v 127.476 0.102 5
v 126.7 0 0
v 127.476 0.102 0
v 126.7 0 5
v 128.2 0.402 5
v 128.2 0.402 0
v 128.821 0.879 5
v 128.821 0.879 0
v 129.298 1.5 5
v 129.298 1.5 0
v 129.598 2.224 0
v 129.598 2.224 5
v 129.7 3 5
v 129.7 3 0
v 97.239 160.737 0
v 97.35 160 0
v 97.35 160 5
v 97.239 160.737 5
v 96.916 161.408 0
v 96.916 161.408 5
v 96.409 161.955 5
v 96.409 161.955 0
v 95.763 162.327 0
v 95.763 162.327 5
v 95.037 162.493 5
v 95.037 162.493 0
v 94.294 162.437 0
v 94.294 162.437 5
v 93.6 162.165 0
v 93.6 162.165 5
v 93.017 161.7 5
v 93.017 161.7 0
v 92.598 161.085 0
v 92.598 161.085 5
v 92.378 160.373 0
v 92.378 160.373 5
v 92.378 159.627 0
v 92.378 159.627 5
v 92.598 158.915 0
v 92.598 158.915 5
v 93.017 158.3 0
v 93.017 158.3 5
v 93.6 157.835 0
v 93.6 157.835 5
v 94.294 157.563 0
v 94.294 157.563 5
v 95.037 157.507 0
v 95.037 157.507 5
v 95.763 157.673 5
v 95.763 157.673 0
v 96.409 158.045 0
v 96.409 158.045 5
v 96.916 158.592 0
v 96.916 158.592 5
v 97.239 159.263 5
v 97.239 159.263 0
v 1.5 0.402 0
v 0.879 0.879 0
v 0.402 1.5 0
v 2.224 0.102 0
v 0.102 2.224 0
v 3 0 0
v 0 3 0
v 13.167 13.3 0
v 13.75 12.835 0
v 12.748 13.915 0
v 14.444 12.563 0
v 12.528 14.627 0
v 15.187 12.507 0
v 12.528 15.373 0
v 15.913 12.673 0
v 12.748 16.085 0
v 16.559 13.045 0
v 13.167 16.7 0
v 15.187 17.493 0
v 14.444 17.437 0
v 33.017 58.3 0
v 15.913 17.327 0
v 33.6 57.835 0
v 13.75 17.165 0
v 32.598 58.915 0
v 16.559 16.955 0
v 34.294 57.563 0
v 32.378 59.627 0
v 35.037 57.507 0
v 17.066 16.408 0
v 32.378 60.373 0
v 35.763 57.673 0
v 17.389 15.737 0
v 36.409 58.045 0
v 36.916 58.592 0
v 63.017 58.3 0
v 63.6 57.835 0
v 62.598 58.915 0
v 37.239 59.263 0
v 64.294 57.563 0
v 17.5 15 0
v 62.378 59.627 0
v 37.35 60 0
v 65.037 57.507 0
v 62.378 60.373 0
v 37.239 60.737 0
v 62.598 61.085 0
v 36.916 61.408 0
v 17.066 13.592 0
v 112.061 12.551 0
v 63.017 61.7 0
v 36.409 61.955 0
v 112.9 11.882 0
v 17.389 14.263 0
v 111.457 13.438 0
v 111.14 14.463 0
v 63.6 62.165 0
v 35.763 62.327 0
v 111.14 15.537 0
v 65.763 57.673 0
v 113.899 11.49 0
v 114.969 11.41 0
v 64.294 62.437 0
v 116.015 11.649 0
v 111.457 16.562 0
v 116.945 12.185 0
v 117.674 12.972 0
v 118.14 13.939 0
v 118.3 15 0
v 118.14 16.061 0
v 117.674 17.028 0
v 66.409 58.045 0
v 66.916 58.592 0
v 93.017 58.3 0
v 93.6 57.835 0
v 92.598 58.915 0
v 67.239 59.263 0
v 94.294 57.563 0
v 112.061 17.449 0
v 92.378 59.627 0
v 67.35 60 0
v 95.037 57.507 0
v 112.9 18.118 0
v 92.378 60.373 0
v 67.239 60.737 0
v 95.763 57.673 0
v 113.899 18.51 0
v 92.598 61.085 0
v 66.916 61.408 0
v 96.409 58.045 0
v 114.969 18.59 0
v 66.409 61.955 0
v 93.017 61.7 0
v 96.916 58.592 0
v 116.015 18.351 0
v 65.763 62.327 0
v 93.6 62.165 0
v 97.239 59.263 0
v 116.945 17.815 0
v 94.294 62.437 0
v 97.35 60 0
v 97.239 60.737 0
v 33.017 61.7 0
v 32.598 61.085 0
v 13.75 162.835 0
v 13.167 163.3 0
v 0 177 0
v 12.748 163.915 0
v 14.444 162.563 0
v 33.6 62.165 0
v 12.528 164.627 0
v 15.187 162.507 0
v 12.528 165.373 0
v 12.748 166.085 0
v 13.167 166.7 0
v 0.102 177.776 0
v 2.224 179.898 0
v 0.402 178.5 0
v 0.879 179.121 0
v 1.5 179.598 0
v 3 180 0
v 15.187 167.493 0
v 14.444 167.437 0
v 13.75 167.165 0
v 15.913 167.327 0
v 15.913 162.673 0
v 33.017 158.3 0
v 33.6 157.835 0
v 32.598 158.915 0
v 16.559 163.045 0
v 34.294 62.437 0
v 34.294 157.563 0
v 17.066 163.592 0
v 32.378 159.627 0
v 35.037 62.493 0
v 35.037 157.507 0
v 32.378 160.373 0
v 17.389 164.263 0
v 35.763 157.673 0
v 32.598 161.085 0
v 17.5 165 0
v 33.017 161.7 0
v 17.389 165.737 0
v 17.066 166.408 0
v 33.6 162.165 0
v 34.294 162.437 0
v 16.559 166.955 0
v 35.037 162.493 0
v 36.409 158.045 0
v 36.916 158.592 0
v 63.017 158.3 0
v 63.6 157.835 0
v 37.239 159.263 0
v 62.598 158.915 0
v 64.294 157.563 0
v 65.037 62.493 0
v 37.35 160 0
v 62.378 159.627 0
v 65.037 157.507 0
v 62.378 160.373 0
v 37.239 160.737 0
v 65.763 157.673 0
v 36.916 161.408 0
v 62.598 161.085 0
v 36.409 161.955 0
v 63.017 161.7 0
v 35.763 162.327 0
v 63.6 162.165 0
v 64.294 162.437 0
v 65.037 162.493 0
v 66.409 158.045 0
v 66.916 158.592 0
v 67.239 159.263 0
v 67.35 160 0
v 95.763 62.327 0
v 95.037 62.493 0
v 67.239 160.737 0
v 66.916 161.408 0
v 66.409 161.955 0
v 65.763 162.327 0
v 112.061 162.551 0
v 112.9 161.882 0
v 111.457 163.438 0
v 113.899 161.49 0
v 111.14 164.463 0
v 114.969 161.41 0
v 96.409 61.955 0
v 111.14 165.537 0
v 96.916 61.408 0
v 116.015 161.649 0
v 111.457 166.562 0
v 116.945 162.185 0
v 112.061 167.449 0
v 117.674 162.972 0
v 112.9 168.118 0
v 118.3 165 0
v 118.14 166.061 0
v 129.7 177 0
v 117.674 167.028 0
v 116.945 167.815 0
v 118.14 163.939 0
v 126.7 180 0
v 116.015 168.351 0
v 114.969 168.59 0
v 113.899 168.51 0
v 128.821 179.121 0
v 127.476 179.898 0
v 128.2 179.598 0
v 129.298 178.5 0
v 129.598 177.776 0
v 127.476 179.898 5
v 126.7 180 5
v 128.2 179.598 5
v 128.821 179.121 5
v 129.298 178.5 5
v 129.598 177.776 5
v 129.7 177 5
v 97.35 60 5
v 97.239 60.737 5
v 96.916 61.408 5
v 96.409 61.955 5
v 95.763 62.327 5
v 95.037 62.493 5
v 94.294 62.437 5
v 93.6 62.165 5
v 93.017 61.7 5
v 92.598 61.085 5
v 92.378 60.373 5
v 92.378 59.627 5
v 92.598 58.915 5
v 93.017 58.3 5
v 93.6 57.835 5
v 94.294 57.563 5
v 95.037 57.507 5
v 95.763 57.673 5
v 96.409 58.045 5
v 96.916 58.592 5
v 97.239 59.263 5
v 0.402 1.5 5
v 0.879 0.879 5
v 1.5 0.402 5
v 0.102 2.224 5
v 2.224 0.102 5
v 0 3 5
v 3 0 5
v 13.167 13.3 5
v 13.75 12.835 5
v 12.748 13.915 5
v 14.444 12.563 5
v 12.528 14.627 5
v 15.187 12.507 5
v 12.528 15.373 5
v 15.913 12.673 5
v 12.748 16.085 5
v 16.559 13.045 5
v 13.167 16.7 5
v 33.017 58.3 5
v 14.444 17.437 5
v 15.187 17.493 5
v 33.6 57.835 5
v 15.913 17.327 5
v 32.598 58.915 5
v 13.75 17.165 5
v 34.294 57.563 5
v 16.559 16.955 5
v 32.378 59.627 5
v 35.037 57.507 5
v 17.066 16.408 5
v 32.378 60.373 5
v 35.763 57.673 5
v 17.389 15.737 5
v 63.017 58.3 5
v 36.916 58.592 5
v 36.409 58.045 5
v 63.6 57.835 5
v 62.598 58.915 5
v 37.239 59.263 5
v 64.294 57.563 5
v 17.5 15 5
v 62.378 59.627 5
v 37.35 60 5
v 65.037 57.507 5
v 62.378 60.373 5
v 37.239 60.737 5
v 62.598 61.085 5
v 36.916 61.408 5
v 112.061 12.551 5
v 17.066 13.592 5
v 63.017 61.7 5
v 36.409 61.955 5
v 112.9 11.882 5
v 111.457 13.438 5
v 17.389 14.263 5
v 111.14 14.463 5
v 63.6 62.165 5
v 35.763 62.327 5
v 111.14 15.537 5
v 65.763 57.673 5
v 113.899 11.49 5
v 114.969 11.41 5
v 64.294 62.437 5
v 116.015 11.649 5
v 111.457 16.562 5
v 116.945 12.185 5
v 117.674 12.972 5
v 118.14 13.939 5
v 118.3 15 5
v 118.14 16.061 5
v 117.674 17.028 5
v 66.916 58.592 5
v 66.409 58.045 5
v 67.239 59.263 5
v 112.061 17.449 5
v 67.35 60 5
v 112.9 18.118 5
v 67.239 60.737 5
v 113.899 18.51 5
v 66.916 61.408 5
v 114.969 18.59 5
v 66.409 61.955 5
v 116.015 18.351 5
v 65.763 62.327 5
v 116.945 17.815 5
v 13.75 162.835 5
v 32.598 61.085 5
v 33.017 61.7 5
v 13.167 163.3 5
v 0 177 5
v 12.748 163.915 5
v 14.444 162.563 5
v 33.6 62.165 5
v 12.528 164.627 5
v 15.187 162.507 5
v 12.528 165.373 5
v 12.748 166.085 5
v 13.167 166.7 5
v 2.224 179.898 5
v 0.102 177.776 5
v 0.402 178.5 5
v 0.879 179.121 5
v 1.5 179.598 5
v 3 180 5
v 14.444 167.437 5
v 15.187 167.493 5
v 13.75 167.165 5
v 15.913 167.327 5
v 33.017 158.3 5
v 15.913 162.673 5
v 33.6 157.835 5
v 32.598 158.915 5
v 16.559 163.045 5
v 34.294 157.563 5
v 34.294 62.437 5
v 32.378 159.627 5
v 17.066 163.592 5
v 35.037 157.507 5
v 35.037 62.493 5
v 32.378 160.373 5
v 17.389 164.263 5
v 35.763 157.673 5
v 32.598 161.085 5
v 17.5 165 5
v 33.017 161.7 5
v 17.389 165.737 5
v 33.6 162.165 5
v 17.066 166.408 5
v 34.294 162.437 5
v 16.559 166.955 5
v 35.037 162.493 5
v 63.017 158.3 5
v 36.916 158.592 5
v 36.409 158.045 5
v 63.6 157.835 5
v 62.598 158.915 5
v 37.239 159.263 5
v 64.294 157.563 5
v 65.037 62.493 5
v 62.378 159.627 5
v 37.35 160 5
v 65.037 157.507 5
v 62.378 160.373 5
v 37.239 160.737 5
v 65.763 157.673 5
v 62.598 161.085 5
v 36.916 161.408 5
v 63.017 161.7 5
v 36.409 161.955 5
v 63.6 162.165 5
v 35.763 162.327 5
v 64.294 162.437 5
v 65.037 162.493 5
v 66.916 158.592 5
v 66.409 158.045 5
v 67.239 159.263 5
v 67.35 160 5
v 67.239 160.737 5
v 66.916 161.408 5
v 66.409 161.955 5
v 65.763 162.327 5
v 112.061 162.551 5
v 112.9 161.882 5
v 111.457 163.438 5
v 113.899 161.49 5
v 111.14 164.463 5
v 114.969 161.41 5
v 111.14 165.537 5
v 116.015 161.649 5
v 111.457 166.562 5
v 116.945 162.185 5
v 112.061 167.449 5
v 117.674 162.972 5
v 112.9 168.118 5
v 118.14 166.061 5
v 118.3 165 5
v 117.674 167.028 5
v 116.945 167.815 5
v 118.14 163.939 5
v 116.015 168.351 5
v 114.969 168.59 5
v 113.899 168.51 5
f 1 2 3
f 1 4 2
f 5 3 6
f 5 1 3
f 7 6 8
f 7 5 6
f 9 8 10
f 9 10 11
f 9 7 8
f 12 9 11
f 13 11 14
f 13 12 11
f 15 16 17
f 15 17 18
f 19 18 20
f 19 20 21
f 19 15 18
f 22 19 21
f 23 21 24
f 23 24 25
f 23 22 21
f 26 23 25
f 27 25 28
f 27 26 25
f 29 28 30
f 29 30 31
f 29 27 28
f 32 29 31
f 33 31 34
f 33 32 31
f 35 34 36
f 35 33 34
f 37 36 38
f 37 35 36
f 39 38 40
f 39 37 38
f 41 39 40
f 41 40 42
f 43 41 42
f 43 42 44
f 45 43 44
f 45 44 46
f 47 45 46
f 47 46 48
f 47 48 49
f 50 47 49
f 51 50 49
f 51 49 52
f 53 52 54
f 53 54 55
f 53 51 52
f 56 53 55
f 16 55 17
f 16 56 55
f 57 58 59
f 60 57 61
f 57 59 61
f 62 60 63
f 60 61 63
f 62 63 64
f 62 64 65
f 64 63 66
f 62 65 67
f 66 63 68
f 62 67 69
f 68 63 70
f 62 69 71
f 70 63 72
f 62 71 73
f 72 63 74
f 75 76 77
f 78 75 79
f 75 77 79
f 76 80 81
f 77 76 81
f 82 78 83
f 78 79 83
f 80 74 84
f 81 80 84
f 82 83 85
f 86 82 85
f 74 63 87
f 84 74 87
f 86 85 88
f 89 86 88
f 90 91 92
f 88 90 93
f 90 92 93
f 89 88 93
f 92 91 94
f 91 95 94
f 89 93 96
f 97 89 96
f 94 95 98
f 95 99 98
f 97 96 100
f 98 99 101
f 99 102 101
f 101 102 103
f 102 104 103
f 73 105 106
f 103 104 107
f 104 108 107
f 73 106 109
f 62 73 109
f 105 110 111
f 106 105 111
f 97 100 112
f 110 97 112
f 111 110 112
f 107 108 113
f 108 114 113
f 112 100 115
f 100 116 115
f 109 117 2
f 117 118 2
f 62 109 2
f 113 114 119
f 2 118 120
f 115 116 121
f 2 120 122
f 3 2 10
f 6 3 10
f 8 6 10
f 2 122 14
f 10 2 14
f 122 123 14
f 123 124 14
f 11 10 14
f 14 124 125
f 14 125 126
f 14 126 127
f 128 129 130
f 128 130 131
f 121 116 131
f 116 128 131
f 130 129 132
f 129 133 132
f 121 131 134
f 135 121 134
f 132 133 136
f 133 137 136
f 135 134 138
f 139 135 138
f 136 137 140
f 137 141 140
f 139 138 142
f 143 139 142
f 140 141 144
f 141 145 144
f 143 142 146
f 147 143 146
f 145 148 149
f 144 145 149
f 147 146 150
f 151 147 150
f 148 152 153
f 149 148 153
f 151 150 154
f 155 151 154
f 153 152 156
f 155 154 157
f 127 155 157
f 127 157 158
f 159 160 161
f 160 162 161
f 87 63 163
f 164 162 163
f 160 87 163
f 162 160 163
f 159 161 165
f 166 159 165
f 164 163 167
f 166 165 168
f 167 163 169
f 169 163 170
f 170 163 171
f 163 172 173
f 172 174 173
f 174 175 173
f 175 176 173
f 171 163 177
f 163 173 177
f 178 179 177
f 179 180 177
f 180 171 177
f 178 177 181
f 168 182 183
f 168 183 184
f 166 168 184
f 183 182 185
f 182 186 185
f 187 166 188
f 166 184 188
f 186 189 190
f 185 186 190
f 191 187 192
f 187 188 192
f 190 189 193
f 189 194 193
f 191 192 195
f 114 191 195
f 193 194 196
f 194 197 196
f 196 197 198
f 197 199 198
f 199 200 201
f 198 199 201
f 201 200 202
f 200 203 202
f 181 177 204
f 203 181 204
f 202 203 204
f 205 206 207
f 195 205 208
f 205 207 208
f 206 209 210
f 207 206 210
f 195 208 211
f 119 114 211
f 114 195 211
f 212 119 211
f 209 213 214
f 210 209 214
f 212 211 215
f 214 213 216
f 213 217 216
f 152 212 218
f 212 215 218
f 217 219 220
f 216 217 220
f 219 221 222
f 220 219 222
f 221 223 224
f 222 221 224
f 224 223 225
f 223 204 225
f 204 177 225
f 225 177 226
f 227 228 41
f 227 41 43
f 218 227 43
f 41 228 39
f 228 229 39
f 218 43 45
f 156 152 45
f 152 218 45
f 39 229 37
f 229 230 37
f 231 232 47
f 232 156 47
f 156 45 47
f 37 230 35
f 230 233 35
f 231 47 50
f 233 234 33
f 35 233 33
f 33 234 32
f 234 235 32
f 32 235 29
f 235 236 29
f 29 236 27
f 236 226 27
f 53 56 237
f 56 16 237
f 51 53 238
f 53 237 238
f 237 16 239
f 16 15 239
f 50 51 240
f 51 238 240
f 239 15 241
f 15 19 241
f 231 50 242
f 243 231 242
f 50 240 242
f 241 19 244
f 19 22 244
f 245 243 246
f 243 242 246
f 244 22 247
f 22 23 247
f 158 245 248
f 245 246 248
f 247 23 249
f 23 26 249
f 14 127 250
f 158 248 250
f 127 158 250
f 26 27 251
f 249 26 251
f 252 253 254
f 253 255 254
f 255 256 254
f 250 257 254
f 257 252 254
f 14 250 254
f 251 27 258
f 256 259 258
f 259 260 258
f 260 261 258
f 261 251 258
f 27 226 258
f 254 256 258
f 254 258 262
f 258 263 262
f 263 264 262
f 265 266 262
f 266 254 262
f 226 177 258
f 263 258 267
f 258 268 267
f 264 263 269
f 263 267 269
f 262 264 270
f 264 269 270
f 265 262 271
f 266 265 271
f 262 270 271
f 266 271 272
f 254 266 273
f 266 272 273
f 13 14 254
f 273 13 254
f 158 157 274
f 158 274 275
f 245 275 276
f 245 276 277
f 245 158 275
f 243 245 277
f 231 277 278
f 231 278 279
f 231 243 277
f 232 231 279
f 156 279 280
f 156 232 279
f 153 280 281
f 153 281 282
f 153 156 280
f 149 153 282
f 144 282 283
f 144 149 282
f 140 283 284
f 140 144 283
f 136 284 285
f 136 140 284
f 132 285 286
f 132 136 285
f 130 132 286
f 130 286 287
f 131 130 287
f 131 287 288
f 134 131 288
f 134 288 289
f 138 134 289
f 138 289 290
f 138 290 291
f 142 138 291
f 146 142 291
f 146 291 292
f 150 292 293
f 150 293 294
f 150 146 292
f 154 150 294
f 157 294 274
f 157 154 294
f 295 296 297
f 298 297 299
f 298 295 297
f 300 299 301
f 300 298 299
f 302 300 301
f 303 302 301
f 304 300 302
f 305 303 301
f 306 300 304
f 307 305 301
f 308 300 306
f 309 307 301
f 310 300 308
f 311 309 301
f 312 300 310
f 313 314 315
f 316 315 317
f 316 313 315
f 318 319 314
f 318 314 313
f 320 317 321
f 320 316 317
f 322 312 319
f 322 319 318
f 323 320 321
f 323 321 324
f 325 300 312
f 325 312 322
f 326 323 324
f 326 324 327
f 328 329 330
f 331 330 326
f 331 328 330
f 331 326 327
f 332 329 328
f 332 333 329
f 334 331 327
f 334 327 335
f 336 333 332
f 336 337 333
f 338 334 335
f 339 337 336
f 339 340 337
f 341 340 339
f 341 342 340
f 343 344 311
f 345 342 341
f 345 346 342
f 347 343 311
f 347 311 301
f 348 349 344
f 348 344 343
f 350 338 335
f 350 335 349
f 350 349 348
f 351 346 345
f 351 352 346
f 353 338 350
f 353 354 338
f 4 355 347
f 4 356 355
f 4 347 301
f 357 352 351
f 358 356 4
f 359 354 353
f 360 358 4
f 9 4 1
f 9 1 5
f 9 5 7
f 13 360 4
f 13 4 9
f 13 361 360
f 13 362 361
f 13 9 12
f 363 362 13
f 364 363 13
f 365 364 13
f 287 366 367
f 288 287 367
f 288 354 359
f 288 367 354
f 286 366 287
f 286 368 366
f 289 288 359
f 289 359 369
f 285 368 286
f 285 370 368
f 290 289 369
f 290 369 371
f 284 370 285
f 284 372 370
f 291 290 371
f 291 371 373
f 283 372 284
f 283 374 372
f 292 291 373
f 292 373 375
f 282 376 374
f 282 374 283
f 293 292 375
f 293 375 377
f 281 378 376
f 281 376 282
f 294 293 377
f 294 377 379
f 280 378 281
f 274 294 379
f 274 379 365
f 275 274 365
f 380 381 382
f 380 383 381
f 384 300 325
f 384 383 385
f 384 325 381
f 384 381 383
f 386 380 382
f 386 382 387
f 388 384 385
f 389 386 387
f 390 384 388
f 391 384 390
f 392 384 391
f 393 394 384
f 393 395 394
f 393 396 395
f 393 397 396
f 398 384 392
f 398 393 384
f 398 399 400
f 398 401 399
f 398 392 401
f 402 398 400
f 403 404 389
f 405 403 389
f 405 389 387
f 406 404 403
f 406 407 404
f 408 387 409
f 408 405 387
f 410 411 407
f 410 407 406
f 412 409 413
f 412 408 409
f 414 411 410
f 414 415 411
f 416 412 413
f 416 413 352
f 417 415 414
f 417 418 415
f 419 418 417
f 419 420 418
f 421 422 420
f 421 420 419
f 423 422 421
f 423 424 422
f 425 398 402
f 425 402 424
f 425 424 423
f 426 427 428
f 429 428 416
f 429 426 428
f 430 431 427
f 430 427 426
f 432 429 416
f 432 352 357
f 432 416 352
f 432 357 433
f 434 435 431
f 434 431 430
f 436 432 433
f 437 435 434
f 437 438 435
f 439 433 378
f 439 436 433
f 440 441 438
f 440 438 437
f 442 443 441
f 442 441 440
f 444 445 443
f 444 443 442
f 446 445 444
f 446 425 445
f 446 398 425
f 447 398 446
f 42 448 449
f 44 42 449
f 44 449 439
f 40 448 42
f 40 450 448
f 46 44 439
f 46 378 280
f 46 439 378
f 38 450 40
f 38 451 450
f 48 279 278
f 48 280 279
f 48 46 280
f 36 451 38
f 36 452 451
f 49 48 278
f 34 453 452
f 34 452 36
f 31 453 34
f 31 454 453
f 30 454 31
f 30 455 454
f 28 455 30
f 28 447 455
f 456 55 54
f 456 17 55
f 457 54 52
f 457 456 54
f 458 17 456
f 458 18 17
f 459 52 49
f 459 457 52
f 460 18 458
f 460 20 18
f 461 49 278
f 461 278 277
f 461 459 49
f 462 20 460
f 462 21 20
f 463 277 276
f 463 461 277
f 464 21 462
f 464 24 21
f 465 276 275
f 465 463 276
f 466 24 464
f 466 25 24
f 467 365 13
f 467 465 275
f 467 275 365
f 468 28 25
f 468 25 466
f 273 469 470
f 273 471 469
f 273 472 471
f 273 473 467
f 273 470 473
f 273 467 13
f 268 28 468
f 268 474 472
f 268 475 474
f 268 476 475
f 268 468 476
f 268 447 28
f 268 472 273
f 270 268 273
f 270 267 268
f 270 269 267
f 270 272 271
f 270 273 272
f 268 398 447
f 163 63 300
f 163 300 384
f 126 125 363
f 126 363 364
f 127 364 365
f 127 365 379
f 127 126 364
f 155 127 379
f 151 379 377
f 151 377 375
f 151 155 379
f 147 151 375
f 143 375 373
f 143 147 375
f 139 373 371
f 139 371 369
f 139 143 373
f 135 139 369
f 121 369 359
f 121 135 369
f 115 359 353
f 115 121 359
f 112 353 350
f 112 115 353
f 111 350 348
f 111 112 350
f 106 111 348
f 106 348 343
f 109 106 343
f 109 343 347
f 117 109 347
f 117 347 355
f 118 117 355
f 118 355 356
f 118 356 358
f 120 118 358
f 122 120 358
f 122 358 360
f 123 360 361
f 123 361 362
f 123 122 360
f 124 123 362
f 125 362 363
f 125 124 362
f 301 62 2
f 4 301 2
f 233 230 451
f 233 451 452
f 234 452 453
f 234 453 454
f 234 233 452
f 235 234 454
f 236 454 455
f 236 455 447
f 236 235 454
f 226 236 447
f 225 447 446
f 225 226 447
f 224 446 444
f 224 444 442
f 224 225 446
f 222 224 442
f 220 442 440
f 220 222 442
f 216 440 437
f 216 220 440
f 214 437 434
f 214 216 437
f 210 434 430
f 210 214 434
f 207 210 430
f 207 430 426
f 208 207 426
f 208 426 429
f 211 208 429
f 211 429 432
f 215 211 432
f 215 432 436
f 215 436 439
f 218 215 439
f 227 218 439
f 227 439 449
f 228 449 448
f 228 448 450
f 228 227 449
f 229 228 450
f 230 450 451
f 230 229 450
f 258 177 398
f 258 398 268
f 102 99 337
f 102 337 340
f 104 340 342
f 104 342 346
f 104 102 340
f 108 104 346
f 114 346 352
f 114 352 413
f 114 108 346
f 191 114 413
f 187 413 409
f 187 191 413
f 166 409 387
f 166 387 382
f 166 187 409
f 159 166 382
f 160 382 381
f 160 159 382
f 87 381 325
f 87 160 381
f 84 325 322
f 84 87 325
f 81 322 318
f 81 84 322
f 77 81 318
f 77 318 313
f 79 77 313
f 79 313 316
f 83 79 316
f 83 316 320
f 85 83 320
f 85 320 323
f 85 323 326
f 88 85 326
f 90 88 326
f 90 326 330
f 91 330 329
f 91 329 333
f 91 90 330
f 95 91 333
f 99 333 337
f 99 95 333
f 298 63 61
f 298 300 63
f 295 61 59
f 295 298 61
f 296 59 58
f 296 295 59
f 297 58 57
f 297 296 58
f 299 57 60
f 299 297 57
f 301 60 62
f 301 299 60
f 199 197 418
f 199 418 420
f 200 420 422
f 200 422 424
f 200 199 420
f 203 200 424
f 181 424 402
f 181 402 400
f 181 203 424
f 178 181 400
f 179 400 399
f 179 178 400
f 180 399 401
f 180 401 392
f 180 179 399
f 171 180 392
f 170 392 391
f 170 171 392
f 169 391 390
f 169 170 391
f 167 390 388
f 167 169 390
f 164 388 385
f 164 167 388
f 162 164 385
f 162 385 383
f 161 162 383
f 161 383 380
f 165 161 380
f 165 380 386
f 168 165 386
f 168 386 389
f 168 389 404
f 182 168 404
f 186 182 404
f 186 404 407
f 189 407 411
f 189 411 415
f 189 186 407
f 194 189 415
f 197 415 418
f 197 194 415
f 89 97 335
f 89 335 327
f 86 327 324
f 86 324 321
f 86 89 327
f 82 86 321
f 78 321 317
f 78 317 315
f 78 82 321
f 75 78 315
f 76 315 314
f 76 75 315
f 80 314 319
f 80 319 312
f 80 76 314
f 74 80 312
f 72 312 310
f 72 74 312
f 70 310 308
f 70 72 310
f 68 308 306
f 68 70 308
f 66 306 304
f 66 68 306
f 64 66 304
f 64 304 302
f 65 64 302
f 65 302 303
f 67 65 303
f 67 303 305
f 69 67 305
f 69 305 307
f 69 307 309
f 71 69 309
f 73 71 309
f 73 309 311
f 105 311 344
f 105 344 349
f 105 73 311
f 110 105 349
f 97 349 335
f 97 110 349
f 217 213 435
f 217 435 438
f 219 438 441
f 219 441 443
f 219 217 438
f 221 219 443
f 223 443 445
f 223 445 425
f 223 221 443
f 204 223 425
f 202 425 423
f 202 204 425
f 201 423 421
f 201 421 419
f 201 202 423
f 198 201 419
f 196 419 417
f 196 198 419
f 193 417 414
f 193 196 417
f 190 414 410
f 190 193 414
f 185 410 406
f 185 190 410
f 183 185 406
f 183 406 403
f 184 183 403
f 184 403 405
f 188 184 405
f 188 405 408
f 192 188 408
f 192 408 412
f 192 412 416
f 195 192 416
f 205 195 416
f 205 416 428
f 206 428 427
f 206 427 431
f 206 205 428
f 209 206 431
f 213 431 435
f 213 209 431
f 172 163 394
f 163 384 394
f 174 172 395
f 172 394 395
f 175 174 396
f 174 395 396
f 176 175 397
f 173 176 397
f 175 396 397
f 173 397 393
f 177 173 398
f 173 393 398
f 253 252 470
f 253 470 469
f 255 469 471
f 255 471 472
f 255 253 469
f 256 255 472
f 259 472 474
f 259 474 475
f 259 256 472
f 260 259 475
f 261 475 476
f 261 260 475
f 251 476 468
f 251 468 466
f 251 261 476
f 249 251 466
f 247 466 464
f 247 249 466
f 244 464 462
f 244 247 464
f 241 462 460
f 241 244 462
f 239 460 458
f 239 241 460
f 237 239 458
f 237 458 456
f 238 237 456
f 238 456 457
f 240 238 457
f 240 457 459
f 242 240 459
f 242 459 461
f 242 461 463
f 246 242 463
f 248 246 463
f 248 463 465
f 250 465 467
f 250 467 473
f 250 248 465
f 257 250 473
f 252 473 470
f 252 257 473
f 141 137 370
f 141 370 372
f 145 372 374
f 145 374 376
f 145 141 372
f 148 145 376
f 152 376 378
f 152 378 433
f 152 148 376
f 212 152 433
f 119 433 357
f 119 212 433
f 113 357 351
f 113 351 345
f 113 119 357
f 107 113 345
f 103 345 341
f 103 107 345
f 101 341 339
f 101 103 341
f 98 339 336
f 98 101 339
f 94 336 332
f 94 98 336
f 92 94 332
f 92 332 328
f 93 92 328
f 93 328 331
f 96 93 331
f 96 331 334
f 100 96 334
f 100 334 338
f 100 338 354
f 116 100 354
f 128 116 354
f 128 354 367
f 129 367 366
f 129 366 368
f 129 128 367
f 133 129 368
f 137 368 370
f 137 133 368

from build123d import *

# Parameters (mm, degrees)
SKETCH1_W           = 129.7
SKETCH1_H           = 180
SKETCH1_R           = 2.5
SKETCH1_R_2         = 3.6
BOSS_EXTRUDE1_DEPTH = 5
FILLET1_R           = 3


with BuildPart() as part:
    # Sketch1 → Boss-Extrude1 (new body)
    with BuildSketch(Plane.XY):
        with Locations((64.85, 90)):
            Rectangle(SKETCH1_W, SKETCH1_H)
        with Locations((15, 15)):
            Circle(SKETCH1_R, mode=Mode.SUBTRACT)
        with Locations((15, 165)):
            Circle(SKETCH1_R, mode=Mode.SUBTRACT)
        with Locations((114.7, 165)):
            Circle(SKETCH1_R_2, mode=Mode.SUBTRACT)
        with Locations((114.7, 15)):
            Circle(SKETCH1_R_2, mode=Mode.SUBTRACT)
        with Locations((34.85, 160)):
            Circle(SKETCH1_R, mode=Mode.SUBTRACT)
        with Locations((64.85, 160)):
            Circle(SKETCH1_R, mode=Mode.SUBTRACT)
        with Locations((94.85, 160)):
            Circle(SKETCH1_R, mode=Mode.SUBTRACT)
        with Locations((34.85, 60)):
            Circle(SKETCH1_R, mode=Mode.SUBTRACT)
        with Locations((64.85, 60)):
            Circle(SKETCH1_R, mode=Mode.SUBTRACT)
        with Locations((94.85, 60)):
            Circle(SKETCH1_R, mode=Mode.SUBTRACT)
    extrude(amount=BOSS_EXTRUDE1_DEPTH)

    # Fillet1
    fillet1_edges = [part.edges().sort_by_distance(p)[0] for p in [
        (0, 180, 2.5),
        (129.7, 180, 2.5),
        (129.7, 0, 2.5),
        (0, 0, 2.5),
    ]]
    fillet(fillet1_edges, radius=FILLET1_R)


solid = part.part
